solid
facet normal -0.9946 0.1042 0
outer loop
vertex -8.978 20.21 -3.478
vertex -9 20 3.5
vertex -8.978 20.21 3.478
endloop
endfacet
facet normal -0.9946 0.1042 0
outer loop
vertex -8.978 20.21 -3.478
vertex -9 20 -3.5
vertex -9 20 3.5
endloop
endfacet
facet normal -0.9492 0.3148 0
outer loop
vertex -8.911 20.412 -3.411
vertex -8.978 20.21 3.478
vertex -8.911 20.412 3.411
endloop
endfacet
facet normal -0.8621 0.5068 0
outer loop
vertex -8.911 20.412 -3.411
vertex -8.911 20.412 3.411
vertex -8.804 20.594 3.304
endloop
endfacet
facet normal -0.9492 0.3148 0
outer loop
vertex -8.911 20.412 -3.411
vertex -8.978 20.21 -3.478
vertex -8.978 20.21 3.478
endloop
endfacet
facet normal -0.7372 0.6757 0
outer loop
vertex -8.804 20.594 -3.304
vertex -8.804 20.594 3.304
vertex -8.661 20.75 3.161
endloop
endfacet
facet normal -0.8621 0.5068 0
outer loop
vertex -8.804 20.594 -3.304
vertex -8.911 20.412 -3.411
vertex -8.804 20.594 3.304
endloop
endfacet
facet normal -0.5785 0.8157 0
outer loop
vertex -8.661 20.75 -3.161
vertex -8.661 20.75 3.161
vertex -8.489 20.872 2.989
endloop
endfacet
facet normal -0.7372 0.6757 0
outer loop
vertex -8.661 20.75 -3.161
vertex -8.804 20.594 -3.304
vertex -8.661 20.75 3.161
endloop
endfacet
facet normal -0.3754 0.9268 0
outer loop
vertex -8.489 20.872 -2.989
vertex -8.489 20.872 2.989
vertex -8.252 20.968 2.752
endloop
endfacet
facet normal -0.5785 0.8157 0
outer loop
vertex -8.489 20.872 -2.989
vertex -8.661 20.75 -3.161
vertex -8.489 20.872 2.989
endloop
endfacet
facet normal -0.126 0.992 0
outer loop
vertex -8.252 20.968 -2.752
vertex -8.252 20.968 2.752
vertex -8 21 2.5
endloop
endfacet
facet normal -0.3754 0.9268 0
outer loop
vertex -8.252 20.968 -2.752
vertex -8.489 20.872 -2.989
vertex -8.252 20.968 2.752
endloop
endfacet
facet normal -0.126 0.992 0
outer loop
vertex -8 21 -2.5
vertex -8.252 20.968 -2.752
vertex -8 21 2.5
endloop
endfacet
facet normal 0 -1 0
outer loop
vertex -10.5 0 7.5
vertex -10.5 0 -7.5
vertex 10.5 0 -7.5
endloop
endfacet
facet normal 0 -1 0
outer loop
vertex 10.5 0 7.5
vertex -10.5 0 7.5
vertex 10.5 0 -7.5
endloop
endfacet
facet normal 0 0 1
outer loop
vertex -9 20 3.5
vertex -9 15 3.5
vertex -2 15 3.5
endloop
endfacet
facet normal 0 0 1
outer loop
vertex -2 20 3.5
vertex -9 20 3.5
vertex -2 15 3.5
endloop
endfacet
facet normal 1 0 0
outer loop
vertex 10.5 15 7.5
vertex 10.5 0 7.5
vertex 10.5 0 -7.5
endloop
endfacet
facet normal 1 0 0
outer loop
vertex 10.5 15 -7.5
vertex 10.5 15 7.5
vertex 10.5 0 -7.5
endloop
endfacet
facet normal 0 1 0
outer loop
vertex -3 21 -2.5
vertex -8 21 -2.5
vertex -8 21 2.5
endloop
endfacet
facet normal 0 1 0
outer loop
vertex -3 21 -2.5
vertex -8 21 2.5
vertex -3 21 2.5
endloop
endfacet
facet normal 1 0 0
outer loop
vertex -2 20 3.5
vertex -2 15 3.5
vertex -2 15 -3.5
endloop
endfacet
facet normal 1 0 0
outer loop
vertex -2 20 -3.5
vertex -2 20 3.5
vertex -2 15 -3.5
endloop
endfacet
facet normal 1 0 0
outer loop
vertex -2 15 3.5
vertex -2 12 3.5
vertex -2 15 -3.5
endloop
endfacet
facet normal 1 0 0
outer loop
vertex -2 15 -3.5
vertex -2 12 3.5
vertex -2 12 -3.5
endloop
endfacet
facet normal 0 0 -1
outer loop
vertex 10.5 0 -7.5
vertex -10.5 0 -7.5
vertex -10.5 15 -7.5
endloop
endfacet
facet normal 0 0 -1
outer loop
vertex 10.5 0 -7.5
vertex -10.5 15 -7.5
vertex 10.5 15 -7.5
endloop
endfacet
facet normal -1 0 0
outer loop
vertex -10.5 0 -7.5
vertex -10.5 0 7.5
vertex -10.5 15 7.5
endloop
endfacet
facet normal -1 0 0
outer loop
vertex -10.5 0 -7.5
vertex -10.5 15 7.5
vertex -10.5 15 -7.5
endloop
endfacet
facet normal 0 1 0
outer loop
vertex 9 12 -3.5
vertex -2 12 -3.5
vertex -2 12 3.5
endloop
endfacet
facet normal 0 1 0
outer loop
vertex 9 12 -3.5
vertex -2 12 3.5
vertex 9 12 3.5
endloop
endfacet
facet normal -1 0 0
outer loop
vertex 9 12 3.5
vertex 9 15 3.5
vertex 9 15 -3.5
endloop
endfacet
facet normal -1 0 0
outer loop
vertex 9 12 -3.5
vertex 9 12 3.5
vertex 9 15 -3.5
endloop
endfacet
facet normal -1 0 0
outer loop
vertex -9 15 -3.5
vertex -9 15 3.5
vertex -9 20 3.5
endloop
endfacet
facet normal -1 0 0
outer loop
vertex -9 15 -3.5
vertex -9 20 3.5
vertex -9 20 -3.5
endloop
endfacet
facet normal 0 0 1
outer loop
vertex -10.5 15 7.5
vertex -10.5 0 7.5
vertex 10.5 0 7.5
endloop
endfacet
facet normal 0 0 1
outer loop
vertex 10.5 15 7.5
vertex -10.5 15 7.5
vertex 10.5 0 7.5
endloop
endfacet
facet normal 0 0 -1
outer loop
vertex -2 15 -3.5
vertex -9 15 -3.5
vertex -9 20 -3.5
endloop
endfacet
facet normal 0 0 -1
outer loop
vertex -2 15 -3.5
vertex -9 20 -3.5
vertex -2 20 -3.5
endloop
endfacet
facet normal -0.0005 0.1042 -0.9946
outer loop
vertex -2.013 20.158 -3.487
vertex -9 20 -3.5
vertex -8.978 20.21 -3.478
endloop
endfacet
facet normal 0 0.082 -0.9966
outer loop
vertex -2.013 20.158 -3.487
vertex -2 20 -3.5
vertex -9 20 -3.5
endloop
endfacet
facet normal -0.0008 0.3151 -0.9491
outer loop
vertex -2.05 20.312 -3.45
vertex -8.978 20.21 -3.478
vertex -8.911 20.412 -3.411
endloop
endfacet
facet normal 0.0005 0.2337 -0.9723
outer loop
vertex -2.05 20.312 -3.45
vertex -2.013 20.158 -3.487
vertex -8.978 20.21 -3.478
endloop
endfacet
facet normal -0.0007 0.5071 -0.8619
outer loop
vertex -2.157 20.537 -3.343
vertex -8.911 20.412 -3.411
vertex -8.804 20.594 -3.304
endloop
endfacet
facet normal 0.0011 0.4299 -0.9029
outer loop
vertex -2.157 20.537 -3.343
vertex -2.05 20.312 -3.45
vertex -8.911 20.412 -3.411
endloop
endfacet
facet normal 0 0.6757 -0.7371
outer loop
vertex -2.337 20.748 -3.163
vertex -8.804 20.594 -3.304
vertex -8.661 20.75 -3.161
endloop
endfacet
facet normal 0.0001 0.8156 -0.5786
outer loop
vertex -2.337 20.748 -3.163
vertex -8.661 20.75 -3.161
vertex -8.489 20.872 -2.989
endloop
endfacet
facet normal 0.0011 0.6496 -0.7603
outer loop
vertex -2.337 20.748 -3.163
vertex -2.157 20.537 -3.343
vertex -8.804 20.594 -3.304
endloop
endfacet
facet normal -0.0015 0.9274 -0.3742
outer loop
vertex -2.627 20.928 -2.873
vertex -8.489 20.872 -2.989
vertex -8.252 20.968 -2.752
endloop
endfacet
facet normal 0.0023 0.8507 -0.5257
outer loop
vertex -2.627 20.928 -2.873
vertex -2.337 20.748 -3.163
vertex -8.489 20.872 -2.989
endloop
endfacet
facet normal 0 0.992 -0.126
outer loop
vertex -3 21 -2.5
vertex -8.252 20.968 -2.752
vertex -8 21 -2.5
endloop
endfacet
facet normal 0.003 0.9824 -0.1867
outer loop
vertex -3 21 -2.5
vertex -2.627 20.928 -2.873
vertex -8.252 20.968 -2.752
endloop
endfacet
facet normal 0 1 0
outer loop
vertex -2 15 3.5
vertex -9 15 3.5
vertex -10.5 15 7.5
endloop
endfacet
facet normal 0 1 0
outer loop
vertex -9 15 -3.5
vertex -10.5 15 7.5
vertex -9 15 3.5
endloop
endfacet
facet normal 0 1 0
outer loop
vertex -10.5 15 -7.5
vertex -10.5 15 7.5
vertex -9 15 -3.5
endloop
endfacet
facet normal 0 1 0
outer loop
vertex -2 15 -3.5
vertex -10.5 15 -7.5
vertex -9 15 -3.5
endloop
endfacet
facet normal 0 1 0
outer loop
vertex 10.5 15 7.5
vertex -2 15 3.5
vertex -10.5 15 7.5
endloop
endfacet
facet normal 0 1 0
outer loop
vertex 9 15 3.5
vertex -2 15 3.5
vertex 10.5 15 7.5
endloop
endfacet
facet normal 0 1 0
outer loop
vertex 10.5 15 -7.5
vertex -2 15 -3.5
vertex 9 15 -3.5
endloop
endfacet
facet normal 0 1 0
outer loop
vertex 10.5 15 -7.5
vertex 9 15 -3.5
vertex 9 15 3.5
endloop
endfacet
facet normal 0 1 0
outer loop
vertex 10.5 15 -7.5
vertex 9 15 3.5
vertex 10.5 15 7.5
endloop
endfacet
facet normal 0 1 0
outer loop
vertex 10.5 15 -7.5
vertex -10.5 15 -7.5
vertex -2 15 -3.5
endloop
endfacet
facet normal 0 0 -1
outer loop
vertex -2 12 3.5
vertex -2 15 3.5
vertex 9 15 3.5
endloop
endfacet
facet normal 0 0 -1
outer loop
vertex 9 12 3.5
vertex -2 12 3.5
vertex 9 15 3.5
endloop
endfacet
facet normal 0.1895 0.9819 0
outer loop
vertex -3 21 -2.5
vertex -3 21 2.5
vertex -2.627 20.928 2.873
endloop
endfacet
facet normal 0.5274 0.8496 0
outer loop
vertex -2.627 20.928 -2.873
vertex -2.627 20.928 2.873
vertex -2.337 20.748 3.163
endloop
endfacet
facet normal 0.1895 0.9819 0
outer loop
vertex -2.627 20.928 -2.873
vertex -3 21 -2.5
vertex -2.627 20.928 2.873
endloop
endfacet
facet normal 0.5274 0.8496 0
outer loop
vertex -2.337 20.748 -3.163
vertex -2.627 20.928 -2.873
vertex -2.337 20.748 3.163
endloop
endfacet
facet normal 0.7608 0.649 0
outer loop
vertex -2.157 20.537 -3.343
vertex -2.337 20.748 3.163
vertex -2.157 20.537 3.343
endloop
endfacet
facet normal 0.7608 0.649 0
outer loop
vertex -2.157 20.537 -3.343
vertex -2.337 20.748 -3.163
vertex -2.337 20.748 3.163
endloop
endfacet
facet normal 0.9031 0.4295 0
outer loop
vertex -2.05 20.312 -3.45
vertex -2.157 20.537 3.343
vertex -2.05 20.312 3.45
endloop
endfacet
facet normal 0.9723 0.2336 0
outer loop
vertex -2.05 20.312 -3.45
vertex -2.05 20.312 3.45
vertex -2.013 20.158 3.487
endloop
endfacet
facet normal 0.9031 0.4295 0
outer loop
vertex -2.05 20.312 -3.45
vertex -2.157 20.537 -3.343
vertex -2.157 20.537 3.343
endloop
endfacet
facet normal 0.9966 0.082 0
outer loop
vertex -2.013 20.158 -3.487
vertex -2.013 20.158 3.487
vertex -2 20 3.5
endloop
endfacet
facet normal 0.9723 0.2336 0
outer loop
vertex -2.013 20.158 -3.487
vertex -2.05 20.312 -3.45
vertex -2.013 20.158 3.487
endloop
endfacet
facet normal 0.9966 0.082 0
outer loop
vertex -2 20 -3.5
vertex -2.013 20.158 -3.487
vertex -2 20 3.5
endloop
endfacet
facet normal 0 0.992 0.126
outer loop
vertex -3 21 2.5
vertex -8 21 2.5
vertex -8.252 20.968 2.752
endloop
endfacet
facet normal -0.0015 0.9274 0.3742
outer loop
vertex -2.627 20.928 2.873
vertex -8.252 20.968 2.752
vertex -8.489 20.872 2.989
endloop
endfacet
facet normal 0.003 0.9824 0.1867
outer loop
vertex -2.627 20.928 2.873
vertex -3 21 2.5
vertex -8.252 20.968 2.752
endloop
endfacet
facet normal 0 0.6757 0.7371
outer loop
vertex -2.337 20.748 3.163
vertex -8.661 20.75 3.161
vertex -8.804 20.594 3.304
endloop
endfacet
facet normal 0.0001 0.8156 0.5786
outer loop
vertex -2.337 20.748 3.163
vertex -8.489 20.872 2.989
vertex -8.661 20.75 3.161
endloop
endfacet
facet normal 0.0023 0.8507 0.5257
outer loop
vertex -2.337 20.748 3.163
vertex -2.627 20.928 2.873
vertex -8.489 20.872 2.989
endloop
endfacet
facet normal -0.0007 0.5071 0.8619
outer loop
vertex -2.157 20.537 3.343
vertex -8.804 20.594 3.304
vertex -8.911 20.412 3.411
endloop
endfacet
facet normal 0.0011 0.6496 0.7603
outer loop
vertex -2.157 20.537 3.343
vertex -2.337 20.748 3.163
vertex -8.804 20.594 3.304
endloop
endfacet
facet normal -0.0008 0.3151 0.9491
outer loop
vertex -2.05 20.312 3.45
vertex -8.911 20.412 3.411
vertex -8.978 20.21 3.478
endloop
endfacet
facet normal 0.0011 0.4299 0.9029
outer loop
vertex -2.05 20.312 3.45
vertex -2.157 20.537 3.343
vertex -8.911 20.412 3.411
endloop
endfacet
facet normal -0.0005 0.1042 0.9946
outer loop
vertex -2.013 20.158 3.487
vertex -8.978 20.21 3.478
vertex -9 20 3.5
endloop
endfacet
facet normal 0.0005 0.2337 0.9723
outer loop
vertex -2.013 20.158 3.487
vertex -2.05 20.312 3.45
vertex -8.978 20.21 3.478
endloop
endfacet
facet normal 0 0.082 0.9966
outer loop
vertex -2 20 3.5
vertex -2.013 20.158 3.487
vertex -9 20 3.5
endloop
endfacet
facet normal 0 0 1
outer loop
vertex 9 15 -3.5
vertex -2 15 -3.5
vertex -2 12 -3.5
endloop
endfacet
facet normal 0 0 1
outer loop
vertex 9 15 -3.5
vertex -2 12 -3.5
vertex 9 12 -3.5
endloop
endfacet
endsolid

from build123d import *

# Parameters (mm, degrees)
SKETCH1_W           = 21
SKETCH1_H           = 15
BOSS_EXTRUDE1_DEPTH = 15
SKETCH3_W           = 18
SKETCH3_H           = 7
CUT_EXTRUDE1_DEPTH  = 3
SKETCH4_W           = 7
SKETCH4_H           = 7
BOSS_EXTRUDE3_DEPTH = 9
FILLET2_R           = 1


with BuildPart() as part:
    # Sketch1 → Boss-Extrude1 (new body)
    with BuildSketch(Plane(origin=(0, 0, 0), x_dir=(1, 0, 0), z_dir=(0, 1, 0))):
        Rectangle(SKETCH1_W, SKETCH1_H)
    extrude(amount=BOSS_EXTRUDE1_DEPTH)

    # Sketch3 → Cut-Extrude1 (cut)
    with BuildSketch(Plane(origin=(0, 15, 0), x_dir=(1, 0, 0), z_dir=(0, 1, 0))):
        Rectangle(SKETCH3_W, SKETCH3_H)
    extrude(amount=-CUT_EXTRUDE1_DEPTH, mode=Mode.SUBTRACT)

    # Sketch4 → Boss-Extrude3 (add)
    with BuildSketch(Plane(origin=(0, 12, 0), x_dir=(1, 0, 0), z_dir=(0, 1, 0))):
        with Locations((-5.5, 0)):
            Rectangle(SKETCH4_W, SKETCH4_H)
    extrude(amount=BOSS_EXTRUDE3_DEPTH)

    # Fillet2
    fillet2_edges = [part.edges().sort_by_distance(p)[0] for p in [
        (-9, 21, 0),
        (-5.5, 21, 3.5),
        (-2, 21, 0),
        (-5.5, 21, -3.5),
    ]]
    fillet(fillet2_edges, radius=FILLET2_R)


solid = part.part
